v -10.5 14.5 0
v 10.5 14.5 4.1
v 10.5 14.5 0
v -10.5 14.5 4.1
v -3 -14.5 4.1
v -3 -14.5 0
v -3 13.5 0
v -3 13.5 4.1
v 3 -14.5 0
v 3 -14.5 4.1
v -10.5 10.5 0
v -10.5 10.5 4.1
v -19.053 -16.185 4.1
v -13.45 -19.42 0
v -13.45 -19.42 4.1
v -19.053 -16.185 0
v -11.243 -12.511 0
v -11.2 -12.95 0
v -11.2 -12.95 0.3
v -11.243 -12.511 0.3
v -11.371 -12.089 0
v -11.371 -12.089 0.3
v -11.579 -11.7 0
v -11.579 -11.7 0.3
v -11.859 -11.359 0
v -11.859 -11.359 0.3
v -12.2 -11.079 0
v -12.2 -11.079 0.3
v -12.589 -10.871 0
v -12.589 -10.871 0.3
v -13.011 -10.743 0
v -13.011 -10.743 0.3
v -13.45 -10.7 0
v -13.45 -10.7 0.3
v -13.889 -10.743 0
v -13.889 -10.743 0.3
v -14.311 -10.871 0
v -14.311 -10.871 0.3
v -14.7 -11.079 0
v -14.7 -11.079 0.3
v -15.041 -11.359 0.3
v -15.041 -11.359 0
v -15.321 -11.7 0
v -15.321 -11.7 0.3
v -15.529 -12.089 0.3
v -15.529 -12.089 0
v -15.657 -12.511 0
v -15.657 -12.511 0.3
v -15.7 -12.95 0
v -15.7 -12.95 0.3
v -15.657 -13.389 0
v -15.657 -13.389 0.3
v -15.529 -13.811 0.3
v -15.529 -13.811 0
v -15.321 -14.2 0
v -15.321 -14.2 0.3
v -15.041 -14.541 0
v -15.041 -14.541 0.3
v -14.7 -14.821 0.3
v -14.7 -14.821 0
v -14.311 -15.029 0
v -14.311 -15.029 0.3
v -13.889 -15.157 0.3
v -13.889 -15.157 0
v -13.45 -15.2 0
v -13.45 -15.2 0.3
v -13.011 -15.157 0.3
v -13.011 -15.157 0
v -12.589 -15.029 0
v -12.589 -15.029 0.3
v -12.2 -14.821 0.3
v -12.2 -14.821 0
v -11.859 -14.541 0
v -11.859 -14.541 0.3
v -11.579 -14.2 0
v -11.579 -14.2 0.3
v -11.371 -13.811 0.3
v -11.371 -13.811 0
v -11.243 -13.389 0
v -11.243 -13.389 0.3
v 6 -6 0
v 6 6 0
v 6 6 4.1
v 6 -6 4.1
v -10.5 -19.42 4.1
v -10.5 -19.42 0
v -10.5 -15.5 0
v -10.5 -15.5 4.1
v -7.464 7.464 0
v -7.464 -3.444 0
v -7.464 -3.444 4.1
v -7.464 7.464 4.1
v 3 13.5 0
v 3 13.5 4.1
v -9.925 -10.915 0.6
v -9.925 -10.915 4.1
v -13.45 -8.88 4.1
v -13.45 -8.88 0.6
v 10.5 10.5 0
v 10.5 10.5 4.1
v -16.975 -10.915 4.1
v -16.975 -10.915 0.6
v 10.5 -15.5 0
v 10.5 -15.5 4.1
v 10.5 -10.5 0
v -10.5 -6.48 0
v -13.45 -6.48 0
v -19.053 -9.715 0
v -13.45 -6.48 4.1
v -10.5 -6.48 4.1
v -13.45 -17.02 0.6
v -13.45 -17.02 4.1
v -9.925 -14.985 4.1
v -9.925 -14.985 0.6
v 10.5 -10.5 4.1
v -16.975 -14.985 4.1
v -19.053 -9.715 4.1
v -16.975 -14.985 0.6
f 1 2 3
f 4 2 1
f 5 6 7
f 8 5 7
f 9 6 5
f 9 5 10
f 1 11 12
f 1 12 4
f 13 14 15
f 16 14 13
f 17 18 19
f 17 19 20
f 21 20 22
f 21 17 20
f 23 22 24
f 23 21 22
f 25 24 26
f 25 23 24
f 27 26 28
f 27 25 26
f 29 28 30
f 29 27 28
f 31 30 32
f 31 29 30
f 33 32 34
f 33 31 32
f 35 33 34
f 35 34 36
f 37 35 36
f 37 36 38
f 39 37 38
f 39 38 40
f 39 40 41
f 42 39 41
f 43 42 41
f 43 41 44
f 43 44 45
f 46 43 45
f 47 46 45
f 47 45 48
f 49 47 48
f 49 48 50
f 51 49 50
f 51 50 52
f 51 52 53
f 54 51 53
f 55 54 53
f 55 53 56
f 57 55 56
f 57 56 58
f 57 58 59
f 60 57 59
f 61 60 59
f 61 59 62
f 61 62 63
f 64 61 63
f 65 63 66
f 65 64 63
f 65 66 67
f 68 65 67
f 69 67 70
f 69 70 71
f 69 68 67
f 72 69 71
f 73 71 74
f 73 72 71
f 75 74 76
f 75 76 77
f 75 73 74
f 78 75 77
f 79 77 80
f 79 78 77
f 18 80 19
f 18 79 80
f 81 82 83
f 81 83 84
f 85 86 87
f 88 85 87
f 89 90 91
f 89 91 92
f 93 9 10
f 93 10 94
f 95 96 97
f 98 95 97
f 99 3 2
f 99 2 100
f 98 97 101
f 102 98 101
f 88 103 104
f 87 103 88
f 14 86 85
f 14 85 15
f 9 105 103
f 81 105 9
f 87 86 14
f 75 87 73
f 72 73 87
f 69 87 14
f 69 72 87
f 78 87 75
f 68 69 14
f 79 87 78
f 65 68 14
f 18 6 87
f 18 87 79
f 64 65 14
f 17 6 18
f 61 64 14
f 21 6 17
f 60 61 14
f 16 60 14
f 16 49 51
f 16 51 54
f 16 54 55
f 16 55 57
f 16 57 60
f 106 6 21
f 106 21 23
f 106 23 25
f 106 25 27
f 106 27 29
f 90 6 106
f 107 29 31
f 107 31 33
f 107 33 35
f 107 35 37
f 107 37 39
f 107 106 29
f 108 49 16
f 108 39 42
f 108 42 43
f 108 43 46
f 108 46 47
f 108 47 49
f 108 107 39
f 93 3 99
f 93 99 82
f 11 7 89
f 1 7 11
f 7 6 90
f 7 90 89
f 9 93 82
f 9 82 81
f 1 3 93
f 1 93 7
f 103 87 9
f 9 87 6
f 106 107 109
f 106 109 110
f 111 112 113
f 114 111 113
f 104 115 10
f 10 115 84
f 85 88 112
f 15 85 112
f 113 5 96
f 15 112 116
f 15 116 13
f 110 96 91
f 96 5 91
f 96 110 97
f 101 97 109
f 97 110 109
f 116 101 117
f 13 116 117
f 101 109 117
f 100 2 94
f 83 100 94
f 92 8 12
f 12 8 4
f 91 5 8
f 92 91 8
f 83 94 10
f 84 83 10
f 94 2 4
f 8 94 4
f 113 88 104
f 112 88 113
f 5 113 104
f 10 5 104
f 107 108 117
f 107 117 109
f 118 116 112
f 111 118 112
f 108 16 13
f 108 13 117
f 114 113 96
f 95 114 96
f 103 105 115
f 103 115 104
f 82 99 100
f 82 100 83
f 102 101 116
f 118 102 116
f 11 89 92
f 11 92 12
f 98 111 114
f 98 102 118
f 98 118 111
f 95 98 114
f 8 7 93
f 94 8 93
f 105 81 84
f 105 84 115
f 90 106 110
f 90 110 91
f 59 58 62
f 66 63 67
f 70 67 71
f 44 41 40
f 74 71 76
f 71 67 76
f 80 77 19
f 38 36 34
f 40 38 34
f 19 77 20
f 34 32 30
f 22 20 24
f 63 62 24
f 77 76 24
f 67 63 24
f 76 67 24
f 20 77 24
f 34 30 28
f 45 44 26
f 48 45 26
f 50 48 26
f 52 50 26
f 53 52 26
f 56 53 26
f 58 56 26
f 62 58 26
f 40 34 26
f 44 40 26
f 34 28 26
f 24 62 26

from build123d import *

# Parameters (mm, degrees)
SKETCH_R        = 2.25
SKETCH_W        = 6
SKETCH_H        = 28
PAD_DEPTH       = 4.1
POCKET_DEPTH    = 3.5
SKETCH003_W     = 21
SKETCH003_H     = 4.1
POCKET001_DEPTH = 1
SKETCH002_R     = 2.25
PAD001_DEPTH    = 0.3


with BuildPart() as part:
    # Sketch → Pad (new body)
    with BuildSketch(Plane.XY):
        Polygon((-10.5, 15.5), (10.5, 15.5), (10.5, 10.499836), (6, 5.999836), (6, -5.999836), (10.5, -10.499836), (10.5, -15.5), (-10.5, -15.5), (-10.5, -17.717136), (-10.5, -19.420319), (-13.45, -19.420319), (-19.053461, -16.18516), (-19.053461, -9.71484), (-13.45, -6.479681), (-10.500002, -6.479681), (-7.46388, -3.443559), (-7.46388, 7.463716), (-10.5, 10.499836), align=None)
        with Locations((-13.45, -12.95)):
            Circle(SKETCH_R, mode=Mode.SUBTRACT)
        with Locations((0, -0.5)):
            Rectangle(SKETCH_W, SKETCH_H, mode=Mode.SUBTRACT)
    extrude(amount=PAD_DEPTH)

    # Sketch001 → Pocket (cut)
    with BuildSketch(Plane.XY.offset(4.1)):
        Polygon((-13.45, -17.020319), (-9.925, -14.98516), (-9.925, -10.91484), (-13.45, -8.879681), (-16.975, -10.91484), (-16.975, -14.98516), align=None)
    extrude(amount=-POCKET_DEPTH, mode=Mode.SUBTRACT)

    # Sketch003 → Pocket001 (cut)
    with BuildSketch(Plane(origin=(0, 15.5, 0), x_dir=(-1, 0, 0), z_dir=(0, 1, 0))):
        with Locations((0, 2.05)):
            Rectangle(SKETCH003_W, SKETCH003_H)
    extrude(amount=-POCKET001_DEPTH, mode=Mode.SUBTRACT)

    # Sketch002 → Pad001 (new body)
    with BuildSketch(Plane.XY.offset(0.6)):
        with Locations((-13.45, -12.95)):
            Circle(SKETCH002_R)
    extrude(amount=-PAD001_DEPTH)


solid = part.part
